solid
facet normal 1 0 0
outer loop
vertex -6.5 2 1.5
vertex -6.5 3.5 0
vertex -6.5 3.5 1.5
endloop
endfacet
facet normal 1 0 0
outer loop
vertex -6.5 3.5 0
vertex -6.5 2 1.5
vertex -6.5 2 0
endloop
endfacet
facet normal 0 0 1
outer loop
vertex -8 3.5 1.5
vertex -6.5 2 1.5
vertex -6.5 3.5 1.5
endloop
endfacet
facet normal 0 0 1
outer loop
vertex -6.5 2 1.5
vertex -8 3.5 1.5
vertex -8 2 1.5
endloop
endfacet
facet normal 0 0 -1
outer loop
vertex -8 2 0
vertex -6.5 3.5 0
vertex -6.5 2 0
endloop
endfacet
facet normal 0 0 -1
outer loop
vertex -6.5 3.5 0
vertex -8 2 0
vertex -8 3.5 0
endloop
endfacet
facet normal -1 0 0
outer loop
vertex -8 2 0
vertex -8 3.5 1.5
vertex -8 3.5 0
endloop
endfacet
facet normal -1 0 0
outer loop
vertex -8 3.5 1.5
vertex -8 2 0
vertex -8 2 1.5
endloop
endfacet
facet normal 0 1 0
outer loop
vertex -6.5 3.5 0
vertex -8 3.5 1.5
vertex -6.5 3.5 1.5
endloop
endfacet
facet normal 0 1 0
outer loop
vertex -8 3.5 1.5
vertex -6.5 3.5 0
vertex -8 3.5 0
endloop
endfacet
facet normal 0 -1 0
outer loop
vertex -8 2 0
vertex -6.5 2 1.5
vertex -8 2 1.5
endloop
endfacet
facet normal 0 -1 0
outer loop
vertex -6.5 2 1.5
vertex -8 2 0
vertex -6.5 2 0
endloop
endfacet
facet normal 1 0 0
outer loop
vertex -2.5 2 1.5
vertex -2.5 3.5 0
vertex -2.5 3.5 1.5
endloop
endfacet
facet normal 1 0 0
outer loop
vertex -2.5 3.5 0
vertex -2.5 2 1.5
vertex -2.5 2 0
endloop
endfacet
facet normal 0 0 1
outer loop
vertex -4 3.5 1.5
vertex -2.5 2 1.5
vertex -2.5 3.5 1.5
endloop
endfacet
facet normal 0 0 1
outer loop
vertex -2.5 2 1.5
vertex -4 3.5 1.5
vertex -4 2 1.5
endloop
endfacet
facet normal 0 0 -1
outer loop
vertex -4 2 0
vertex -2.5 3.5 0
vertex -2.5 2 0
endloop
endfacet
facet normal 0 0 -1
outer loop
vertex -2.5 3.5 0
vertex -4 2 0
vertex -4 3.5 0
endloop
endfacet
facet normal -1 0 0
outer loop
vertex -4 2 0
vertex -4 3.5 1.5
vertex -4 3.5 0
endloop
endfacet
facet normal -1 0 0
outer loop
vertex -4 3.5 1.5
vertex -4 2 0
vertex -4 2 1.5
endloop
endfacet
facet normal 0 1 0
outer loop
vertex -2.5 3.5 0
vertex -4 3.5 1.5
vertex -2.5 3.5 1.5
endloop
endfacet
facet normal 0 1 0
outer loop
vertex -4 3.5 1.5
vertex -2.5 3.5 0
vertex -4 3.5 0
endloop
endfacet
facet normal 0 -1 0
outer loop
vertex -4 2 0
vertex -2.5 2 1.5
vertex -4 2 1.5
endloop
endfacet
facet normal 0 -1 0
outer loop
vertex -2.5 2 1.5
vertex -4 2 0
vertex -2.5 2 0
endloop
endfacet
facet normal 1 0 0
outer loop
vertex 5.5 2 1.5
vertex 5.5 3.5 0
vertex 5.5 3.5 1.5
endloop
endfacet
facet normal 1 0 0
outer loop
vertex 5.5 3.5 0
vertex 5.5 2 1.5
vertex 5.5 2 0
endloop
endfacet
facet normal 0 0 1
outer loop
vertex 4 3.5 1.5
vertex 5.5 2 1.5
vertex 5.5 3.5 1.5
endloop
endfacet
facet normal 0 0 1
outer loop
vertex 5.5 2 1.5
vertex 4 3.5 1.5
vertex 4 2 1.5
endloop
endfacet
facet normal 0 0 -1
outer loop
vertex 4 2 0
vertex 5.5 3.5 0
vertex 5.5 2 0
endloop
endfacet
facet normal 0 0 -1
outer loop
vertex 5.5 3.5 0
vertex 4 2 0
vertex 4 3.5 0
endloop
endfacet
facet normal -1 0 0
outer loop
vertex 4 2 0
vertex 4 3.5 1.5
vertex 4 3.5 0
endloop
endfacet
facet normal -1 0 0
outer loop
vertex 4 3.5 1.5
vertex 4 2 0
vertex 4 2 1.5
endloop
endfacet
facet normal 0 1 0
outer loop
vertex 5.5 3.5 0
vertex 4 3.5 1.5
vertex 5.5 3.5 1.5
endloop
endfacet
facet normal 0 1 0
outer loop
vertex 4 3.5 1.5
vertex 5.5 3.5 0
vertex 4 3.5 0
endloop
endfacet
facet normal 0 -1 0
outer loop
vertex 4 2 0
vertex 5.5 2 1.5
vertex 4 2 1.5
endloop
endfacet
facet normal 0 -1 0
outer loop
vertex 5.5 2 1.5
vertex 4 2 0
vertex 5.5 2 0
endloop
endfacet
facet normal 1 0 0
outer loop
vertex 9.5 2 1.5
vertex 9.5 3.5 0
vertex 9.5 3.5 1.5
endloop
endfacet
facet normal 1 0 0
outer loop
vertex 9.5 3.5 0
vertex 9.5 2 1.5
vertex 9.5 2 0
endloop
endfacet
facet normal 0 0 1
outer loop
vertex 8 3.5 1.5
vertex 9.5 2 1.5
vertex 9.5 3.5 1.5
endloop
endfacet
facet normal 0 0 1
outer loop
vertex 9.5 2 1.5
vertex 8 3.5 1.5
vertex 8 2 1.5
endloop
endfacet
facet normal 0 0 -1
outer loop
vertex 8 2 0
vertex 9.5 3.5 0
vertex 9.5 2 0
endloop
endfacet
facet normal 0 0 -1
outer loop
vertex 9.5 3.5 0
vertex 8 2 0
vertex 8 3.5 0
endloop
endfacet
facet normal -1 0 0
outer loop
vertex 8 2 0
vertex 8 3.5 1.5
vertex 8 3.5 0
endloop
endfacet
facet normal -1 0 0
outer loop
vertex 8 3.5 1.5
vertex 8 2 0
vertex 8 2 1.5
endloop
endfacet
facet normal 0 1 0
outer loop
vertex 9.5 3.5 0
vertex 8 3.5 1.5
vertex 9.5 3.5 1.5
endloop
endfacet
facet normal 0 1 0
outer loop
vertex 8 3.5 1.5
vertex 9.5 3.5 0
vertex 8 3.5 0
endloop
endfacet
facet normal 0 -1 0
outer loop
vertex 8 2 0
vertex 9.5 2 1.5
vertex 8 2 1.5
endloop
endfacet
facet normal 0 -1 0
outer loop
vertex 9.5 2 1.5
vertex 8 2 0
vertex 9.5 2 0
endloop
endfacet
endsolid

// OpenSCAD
union() {
	translate([-8, 2, 0]) cube(size=[1.5,1.5,1.5], center=false);
	translate([-4, 2, 0]) cube(size=[1.5,1.5,1.5], center=false);
	translate([4, 2, 0]) cube(size=[1.5,1.5,1.5], center=false);
	translate([8, 2, 0]) cube(size=[1.5,1.5,1.5], center=false);
}
